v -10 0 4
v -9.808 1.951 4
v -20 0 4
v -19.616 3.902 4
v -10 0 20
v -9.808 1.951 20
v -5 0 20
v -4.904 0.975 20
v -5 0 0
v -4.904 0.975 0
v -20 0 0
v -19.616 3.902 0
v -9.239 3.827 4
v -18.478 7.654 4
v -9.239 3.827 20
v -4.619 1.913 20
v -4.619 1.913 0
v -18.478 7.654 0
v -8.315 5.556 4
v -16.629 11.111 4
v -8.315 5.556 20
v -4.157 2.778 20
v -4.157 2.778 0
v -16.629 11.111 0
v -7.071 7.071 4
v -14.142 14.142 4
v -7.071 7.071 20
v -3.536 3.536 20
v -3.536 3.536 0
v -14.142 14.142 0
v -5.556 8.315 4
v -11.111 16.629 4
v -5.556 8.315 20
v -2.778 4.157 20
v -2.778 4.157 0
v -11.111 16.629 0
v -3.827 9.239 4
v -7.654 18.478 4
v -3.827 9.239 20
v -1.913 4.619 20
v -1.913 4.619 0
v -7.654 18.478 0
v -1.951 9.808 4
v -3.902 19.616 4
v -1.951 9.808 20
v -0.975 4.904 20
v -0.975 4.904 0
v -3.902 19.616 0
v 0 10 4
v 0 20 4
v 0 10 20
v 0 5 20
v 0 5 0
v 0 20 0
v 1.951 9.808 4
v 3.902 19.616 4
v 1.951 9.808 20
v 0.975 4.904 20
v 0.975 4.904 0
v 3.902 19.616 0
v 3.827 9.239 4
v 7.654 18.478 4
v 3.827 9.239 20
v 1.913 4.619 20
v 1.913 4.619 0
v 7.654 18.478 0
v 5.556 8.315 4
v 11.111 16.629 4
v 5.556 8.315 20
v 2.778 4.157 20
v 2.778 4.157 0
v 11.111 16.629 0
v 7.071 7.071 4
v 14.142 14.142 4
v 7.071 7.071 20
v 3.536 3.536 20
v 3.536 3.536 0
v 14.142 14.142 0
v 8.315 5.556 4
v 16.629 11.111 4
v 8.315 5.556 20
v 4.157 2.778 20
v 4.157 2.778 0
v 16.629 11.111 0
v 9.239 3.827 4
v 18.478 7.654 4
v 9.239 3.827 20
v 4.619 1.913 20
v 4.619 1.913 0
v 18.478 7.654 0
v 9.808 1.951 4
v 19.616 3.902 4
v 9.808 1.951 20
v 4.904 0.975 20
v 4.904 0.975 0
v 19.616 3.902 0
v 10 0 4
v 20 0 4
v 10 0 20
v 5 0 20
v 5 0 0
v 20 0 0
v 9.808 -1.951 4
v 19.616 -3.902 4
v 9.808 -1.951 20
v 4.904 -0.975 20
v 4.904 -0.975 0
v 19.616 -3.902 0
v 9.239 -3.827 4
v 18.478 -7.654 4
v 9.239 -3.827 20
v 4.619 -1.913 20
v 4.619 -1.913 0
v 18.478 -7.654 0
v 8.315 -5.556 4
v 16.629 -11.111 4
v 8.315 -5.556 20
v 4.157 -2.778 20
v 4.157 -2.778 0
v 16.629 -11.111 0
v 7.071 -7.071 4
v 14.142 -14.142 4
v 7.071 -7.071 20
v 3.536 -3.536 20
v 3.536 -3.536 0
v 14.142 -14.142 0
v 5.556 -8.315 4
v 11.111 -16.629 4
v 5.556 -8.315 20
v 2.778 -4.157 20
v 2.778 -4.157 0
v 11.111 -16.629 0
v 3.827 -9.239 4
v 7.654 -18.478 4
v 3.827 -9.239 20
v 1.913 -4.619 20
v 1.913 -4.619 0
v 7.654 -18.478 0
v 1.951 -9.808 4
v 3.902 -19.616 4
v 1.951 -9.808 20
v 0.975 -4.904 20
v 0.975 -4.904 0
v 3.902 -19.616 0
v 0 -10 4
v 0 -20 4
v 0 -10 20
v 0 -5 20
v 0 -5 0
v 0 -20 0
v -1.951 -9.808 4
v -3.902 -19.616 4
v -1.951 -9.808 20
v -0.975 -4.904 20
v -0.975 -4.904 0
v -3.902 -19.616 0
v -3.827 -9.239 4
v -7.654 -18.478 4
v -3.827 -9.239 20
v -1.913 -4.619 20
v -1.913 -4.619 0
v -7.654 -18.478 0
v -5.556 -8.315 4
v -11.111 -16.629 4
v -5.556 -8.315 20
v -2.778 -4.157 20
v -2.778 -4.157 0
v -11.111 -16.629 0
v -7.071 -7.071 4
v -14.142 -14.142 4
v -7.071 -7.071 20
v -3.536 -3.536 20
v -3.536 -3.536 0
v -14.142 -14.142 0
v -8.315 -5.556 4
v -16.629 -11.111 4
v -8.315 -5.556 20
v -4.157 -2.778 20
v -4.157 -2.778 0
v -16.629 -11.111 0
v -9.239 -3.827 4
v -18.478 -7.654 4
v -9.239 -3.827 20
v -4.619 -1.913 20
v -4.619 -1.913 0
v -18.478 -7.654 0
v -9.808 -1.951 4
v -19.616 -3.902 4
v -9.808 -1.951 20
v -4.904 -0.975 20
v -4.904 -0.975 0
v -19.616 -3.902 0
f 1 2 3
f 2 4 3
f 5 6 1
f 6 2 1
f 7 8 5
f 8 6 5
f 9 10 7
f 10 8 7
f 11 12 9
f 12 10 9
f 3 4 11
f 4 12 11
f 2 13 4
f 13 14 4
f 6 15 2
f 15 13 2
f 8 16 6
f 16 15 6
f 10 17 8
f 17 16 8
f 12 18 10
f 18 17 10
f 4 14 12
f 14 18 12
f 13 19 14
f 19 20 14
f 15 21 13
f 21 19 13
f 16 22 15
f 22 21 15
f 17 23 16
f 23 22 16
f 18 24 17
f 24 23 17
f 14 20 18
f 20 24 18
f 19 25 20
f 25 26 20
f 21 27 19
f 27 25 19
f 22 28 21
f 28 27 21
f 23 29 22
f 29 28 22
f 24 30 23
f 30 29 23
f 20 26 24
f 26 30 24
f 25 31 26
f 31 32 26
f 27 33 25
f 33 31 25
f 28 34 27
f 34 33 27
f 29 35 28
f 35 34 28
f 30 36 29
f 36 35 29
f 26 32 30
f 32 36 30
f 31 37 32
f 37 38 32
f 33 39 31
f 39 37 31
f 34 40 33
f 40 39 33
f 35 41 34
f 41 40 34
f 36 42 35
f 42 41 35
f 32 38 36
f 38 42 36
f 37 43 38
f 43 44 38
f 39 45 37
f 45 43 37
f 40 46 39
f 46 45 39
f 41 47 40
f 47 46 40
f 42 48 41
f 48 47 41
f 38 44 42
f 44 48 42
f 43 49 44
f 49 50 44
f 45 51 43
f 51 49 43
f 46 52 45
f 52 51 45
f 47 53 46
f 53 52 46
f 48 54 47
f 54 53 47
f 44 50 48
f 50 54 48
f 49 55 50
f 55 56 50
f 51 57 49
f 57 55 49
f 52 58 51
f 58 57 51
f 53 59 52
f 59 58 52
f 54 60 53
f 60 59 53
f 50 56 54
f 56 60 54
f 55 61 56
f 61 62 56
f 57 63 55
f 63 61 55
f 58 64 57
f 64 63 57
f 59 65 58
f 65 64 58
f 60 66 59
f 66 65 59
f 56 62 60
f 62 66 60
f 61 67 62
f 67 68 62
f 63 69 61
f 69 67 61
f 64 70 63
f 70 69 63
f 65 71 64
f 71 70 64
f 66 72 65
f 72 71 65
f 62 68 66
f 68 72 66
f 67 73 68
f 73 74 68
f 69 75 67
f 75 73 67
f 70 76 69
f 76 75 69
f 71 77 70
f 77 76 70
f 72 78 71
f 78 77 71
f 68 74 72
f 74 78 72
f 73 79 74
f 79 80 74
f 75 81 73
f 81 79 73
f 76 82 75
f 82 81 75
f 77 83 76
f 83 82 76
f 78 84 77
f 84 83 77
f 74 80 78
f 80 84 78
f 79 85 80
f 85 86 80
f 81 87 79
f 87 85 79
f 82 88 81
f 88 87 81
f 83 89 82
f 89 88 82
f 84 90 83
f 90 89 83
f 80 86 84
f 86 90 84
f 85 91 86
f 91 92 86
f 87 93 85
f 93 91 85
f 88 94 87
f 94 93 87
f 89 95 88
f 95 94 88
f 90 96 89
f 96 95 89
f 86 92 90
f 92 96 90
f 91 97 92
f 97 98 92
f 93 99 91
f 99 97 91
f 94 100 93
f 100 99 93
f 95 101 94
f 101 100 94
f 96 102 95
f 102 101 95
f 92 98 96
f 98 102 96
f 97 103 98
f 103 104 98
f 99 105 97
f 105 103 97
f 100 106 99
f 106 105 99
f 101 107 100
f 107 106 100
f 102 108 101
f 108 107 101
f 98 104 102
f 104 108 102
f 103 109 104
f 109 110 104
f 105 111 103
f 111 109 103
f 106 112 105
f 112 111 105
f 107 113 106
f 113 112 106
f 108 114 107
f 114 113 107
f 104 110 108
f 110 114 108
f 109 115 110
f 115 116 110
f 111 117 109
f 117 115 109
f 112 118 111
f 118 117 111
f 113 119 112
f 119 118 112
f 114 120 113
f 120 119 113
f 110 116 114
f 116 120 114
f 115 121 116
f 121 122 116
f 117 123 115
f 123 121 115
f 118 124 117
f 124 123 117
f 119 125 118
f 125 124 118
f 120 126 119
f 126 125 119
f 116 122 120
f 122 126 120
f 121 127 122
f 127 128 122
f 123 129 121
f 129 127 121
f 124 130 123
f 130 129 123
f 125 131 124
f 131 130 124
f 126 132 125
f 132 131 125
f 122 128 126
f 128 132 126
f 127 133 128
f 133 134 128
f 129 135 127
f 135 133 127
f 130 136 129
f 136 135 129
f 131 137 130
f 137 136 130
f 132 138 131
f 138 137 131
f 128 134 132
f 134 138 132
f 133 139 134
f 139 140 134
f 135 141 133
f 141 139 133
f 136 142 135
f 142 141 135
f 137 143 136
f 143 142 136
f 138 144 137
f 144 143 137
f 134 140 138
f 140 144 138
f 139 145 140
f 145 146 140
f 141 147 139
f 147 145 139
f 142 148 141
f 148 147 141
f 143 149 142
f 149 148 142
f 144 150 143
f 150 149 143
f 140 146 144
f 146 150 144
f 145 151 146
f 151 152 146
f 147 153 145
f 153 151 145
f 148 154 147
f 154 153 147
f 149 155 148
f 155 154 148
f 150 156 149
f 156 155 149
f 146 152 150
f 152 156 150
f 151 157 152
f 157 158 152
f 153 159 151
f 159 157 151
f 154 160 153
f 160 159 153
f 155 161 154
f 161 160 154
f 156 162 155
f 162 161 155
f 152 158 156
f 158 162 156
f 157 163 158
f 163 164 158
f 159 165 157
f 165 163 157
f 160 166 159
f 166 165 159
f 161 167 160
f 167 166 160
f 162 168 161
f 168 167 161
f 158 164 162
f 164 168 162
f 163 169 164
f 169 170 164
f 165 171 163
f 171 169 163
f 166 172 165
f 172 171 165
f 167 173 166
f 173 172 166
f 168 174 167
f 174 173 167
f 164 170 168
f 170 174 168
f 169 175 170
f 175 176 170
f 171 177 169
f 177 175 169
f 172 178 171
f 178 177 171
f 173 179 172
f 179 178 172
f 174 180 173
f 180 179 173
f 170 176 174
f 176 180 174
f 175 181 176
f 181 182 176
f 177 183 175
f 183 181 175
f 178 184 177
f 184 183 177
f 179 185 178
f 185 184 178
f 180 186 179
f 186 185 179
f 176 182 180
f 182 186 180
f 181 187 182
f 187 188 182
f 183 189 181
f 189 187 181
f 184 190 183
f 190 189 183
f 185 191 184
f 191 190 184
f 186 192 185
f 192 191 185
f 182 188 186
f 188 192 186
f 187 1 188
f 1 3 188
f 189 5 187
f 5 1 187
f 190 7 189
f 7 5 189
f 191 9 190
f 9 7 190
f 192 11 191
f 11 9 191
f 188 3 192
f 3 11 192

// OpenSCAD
$fn = 32;

// ----------------------------------------------------------------------
// Revolved part: flanged bushing R20
// ----------------------------------------------------------------------

// --- parameters (mm) ---
bore_r = 5;               // bore radius
flange_r = 20;            // flange radius
flange_h = 4;             // flange thickness
sleeve_r = 10;            // sleeve radius
total_h = 20;             // overall height
revolve_angle = 360;      // revolve sweep, degrees
fit_tol = 0.05;           // declared fit tolerance (prompt contract)
free_tol = 0.3;           // declared free tolerance (prompt contract)

bore_d = 2 * bore_r;
flange_d = 2 * flange_r;
sleeve_d = 2 * sleeve_r;

profile = [[5, 0], [20, 0], [20, 4], [10, 4], [10, 20], [5, 20]];  // primary outline, 6 points, counter clockwise

// --- the one profile operation ---
rotate_extrude(angle = revolve_angle) polygon(points = profile);
